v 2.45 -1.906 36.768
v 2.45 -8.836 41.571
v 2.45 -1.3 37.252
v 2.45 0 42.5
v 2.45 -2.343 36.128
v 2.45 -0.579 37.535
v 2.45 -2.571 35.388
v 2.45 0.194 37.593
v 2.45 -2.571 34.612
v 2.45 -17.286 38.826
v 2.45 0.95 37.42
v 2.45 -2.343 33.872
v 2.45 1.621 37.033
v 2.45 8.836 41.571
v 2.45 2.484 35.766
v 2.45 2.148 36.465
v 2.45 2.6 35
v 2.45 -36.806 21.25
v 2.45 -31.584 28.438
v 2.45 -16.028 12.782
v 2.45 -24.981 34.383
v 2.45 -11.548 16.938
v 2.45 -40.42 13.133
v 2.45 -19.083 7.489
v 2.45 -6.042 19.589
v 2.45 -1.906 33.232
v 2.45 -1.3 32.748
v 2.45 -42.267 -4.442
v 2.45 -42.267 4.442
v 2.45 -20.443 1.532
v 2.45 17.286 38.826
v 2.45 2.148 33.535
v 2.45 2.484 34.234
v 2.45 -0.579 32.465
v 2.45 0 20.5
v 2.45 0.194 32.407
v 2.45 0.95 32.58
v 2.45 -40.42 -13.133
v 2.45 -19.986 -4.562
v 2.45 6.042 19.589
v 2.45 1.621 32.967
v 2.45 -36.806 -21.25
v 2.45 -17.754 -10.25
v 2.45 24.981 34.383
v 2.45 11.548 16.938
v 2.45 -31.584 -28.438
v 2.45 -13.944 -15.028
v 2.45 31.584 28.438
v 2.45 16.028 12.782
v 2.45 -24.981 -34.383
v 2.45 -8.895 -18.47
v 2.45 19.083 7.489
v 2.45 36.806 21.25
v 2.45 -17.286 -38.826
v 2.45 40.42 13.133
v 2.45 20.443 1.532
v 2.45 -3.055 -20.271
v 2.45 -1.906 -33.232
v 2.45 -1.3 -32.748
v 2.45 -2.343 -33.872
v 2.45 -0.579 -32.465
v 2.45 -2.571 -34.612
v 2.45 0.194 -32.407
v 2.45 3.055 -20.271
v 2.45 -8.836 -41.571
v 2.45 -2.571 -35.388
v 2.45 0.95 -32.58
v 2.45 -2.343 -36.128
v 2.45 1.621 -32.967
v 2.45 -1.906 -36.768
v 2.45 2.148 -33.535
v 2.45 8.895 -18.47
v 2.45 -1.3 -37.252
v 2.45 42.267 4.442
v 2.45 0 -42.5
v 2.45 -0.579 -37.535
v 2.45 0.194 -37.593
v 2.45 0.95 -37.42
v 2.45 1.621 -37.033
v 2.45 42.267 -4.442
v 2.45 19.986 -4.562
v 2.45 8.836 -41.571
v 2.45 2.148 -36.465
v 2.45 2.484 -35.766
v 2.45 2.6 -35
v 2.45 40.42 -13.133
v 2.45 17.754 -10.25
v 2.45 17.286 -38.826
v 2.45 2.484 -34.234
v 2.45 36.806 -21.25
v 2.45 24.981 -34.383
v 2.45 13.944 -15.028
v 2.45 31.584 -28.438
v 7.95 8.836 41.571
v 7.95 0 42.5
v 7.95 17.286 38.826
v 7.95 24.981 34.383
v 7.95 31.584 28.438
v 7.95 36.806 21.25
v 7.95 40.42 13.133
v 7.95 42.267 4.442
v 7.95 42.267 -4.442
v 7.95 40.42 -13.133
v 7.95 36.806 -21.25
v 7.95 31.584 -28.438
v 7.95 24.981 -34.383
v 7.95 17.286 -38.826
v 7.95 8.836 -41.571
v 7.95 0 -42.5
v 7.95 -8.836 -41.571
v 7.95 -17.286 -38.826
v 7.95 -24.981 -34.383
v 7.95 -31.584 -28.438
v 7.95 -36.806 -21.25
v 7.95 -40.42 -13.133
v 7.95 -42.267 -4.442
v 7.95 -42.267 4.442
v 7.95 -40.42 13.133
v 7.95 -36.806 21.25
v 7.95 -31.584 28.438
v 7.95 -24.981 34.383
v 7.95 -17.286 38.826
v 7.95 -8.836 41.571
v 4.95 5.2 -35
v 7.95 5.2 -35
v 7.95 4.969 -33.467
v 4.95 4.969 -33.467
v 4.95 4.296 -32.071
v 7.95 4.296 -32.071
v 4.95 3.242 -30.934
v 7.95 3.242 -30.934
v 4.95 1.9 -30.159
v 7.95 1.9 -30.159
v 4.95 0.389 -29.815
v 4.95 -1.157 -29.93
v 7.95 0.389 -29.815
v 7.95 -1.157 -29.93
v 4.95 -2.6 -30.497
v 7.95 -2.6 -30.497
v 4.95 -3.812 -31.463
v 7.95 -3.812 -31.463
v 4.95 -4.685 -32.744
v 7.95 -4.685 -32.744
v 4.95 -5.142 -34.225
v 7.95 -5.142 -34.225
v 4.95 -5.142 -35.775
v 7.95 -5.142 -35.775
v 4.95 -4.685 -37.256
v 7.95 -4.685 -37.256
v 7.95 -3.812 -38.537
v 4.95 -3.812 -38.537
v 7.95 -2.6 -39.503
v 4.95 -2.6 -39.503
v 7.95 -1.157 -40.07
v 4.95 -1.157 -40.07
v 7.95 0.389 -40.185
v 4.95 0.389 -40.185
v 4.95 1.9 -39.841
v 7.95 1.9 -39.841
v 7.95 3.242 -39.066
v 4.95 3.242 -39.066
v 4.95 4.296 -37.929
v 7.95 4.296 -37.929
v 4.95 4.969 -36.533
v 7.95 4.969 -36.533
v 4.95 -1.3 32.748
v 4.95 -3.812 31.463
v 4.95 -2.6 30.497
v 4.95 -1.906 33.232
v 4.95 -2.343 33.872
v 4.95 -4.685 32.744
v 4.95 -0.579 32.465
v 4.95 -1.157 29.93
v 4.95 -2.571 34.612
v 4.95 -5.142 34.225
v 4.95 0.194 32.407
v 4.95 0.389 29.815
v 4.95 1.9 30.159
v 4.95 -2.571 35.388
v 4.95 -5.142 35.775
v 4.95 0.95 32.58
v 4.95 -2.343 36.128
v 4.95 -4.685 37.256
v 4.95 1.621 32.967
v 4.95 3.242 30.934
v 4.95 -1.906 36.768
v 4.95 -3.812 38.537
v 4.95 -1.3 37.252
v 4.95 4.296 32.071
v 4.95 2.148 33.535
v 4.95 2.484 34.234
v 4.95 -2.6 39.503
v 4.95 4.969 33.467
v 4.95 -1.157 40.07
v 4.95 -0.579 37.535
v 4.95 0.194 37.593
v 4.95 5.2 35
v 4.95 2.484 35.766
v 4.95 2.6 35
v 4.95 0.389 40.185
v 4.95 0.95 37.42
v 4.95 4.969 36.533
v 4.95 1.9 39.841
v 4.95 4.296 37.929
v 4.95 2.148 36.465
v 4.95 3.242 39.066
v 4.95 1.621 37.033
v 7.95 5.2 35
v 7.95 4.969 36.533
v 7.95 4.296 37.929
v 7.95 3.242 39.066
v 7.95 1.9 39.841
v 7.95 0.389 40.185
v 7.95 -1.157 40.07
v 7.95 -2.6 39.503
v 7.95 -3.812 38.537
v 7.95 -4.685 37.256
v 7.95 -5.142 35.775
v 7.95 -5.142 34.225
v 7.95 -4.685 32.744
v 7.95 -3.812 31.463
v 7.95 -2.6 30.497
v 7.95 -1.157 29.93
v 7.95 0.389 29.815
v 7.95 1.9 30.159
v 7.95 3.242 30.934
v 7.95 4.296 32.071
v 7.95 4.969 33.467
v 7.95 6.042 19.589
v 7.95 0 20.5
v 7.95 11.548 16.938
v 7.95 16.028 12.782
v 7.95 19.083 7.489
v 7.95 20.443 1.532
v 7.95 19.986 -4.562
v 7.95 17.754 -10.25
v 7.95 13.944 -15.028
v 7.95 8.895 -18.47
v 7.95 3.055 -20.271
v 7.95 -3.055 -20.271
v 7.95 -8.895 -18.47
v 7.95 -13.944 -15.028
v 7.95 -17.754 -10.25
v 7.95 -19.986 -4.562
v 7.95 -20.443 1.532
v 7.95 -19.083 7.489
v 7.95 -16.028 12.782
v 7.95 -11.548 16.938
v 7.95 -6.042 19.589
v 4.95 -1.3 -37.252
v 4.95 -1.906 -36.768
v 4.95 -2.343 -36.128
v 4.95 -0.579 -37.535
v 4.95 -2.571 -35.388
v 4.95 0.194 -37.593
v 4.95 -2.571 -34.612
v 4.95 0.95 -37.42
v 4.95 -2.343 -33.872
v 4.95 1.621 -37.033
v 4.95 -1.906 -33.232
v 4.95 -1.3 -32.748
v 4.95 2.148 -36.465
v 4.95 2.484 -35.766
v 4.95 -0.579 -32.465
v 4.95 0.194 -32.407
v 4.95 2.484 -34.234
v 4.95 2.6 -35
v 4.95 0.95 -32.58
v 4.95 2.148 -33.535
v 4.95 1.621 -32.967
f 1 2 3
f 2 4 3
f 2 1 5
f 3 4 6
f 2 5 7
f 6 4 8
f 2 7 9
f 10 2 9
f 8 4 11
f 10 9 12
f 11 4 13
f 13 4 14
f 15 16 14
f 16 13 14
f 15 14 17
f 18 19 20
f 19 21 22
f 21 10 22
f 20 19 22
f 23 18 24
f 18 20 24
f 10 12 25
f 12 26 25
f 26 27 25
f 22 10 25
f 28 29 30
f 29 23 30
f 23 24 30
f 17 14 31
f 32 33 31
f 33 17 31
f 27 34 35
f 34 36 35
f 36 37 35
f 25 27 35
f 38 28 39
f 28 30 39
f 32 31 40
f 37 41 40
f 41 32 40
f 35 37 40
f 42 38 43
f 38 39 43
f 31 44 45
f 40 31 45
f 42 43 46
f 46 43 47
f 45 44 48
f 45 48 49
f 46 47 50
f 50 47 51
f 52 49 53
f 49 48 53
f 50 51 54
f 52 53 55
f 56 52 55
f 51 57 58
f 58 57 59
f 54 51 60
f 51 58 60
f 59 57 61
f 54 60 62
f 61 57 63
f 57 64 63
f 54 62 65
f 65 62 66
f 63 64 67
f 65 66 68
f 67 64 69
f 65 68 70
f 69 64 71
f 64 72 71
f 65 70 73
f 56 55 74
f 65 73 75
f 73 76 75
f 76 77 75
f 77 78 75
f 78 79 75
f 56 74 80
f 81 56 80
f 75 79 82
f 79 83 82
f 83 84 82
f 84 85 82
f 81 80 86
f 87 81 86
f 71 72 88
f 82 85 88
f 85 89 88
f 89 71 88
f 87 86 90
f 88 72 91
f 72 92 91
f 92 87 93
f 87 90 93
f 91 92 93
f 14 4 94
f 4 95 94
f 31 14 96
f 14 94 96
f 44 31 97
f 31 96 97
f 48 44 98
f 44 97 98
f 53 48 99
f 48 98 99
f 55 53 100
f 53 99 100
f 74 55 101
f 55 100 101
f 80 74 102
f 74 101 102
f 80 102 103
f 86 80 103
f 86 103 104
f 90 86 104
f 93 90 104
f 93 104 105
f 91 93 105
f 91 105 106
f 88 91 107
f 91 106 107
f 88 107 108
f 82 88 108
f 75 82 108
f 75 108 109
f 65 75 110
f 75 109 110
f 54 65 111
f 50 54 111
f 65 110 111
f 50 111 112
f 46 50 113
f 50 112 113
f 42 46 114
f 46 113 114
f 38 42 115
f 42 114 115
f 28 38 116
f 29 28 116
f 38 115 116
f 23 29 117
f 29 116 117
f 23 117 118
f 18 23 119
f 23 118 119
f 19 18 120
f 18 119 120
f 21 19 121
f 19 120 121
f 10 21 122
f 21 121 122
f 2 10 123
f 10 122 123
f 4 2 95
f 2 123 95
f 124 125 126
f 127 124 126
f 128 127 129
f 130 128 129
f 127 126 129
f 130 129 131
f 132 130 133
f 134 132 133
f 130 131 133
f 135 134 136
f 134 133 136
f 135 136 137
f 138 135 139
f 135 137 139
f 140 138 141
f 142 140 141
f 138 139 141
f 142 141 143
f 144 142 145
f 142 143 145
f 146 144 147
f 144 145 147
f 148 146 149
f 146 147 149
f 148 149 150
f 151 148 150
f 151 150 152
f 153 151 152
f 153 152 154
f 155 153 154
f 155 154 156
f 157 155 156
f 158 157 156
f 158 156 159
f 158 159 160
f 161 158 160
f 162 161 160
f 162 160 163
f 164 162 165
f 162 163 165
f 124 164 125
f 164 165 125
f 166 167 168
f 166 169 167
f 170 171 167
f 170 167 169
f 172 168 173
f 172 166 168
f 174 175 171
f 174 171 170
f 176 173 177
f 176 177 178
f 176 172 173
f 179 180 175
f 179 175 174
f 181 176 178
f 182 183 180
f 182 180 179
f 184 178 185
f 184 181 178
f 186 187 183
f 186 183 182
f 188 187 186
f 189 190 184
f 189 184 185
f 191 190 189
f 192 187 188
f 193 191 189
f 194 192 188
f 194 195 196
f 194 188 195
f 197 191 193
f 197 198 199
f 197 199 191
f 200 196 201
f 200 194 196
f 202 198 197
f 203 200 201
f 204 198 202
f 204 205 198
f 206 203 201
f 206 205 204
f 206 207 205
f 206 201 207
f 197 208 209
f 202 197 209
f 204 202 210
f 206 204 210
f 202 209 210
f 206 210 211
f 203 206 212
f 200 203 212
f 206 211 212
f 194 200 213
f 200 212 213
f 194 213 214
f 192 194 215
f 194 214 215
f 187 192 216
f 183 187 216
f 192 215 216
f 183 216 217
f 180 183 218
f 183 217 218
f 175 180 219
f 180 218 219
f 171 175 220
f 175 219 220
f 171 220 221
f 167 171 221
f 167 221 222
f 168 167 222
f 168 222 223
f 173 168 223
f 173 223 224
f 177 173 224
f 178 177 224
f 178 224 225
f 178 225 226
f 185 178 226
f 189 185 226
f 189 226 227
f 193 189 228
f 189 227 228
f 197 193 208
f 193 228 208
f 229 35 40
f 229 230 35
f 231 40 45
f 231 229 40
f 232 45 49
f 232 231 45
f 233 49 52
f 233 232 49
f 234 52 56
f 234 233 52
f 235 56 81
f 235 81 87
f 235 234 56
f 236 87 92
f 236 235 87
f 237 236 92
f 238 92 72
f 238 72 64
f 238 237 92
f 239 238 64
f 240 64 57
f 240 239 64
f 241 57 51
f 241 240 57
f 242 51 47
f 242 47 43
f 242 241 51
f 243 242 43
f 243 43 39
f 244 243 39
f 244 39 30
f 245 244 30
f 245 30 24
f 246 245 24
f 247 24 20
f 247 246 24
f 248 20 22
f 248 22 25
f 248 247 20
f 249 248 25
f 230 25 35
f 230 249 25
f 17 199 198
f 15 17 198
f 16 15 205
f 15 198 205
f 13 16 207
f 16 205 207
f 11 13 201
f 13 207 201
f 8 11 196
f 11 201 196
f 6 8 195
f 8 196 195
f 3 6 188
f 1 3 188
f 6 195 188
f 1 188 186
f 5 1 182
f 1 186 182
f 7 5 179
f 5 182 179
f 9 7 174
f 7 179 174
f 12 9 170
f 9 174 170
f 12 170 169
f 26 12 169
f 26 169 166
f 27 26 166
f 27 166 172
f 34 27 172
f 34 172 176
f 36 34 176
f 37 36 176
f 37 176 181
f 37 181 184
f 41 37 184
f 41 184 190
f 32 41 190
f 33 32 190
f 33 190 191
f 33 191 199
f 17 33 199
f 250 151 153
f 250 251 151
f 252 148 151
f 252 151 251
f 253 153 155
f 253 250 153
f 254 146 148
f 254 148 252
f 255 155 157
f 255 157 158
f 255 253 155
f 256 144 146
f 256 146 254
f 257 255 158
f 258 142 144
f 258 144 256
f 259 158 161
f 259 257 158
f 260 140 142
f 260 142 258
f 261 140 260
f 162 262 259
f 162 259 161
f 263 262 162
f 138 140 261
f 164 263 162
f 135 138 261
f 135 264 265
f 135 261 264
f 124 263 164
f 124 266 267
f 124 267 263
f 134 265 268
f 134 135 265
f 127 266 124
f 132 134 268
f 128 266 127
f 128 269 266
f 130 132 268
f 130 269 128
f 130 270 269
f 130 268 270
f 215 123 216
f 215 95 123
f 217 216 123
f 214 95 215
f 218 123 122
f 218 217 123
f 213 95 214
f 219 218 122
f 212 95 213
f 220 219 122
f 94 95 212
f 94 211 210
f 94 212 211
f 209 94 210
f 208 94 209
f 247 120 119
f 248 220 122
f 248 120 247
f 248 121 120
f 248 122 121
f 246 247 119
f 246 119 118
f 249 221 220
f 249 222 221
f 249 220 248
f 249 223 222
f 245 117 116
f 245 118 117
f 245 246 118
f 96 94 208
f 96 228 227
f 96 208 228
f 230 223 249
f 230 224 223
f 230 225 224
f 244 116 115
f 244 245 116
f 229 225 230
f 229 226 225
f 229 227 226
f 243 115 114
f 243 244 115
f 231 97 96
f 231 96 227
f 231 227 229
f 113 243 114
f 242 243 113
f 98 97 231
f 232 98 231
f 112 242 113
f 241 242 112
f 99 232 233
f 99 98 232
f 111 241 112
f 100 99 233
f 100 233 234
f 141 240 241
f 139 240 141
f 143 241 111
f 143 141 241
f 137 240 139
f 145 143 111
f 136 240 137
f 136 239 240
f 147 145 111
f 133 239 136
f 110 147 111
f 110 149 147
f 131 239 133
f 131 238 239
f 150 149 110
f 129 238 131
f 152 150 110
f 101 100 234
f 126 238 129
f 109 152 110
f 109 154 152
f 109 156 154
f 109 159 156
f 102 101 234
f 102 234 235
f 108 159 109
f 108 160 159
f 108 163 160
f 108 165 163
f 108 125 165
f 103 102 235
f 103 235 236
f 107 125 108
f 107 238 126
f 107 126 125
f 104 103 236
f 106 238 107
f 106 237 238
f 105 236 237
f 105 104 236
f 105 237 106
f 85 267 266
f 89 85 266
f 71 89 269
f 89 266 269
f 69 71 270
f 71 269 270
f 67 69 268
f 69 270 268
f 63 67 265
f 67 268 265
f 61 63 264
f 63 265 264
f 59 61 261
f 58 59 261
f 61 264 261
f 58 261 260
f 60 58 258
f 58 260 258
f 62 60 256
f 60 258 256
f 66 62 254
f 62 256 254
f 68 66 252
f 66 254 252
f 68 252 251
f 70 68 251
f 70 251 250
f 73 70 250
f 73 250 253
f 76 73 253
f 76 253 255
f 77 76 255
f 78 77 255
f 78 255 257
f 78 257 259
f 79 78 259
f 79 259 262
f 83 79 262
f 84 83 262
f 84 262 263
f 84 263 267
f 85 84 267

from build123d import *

# Parameters (mm, degrees)
F0_W     = 5.5
F0_H     = 22
F2_R     = 5.2
F3_DEPTH = 3
F4_R     = 2.6
F5_DEPTH = 25


with BuildPart() as f1:
    # F0 (on Front) → F1 (revolve)
    with BuildSketch(Plane.XZ):
        with Locations((5.199999, 31.5)):
            Rectangle(F0_W, F0_H)
    revolve(axis=Axis((-4.686111, 0, 0), (-1, 0, 0)))

    # F2 (on face) → F3 (cut)
    with BuildSketch(Plane.YZ.offset(7.949999)):
        with Locations((0, 35)):
            Circle(F2_R)
        with Locations((0, -35)):
            Circle(F2_R)
    extrude(amount=-F3_DEPTH, mode=Mode.SUBTRACT)

    # F4 (on face) → F5 (cut)
    with BuildSketch(Plane.YZ.offset(4.949999)):
        with Locations((0, 35)):
            Circle(F4_R)
        with Locations((0, -35)):
            Circle(F4_R)
    extrude(amount=-F5_DEPTH, mode=Mode.SUBTRACT)


solid = f1.part
